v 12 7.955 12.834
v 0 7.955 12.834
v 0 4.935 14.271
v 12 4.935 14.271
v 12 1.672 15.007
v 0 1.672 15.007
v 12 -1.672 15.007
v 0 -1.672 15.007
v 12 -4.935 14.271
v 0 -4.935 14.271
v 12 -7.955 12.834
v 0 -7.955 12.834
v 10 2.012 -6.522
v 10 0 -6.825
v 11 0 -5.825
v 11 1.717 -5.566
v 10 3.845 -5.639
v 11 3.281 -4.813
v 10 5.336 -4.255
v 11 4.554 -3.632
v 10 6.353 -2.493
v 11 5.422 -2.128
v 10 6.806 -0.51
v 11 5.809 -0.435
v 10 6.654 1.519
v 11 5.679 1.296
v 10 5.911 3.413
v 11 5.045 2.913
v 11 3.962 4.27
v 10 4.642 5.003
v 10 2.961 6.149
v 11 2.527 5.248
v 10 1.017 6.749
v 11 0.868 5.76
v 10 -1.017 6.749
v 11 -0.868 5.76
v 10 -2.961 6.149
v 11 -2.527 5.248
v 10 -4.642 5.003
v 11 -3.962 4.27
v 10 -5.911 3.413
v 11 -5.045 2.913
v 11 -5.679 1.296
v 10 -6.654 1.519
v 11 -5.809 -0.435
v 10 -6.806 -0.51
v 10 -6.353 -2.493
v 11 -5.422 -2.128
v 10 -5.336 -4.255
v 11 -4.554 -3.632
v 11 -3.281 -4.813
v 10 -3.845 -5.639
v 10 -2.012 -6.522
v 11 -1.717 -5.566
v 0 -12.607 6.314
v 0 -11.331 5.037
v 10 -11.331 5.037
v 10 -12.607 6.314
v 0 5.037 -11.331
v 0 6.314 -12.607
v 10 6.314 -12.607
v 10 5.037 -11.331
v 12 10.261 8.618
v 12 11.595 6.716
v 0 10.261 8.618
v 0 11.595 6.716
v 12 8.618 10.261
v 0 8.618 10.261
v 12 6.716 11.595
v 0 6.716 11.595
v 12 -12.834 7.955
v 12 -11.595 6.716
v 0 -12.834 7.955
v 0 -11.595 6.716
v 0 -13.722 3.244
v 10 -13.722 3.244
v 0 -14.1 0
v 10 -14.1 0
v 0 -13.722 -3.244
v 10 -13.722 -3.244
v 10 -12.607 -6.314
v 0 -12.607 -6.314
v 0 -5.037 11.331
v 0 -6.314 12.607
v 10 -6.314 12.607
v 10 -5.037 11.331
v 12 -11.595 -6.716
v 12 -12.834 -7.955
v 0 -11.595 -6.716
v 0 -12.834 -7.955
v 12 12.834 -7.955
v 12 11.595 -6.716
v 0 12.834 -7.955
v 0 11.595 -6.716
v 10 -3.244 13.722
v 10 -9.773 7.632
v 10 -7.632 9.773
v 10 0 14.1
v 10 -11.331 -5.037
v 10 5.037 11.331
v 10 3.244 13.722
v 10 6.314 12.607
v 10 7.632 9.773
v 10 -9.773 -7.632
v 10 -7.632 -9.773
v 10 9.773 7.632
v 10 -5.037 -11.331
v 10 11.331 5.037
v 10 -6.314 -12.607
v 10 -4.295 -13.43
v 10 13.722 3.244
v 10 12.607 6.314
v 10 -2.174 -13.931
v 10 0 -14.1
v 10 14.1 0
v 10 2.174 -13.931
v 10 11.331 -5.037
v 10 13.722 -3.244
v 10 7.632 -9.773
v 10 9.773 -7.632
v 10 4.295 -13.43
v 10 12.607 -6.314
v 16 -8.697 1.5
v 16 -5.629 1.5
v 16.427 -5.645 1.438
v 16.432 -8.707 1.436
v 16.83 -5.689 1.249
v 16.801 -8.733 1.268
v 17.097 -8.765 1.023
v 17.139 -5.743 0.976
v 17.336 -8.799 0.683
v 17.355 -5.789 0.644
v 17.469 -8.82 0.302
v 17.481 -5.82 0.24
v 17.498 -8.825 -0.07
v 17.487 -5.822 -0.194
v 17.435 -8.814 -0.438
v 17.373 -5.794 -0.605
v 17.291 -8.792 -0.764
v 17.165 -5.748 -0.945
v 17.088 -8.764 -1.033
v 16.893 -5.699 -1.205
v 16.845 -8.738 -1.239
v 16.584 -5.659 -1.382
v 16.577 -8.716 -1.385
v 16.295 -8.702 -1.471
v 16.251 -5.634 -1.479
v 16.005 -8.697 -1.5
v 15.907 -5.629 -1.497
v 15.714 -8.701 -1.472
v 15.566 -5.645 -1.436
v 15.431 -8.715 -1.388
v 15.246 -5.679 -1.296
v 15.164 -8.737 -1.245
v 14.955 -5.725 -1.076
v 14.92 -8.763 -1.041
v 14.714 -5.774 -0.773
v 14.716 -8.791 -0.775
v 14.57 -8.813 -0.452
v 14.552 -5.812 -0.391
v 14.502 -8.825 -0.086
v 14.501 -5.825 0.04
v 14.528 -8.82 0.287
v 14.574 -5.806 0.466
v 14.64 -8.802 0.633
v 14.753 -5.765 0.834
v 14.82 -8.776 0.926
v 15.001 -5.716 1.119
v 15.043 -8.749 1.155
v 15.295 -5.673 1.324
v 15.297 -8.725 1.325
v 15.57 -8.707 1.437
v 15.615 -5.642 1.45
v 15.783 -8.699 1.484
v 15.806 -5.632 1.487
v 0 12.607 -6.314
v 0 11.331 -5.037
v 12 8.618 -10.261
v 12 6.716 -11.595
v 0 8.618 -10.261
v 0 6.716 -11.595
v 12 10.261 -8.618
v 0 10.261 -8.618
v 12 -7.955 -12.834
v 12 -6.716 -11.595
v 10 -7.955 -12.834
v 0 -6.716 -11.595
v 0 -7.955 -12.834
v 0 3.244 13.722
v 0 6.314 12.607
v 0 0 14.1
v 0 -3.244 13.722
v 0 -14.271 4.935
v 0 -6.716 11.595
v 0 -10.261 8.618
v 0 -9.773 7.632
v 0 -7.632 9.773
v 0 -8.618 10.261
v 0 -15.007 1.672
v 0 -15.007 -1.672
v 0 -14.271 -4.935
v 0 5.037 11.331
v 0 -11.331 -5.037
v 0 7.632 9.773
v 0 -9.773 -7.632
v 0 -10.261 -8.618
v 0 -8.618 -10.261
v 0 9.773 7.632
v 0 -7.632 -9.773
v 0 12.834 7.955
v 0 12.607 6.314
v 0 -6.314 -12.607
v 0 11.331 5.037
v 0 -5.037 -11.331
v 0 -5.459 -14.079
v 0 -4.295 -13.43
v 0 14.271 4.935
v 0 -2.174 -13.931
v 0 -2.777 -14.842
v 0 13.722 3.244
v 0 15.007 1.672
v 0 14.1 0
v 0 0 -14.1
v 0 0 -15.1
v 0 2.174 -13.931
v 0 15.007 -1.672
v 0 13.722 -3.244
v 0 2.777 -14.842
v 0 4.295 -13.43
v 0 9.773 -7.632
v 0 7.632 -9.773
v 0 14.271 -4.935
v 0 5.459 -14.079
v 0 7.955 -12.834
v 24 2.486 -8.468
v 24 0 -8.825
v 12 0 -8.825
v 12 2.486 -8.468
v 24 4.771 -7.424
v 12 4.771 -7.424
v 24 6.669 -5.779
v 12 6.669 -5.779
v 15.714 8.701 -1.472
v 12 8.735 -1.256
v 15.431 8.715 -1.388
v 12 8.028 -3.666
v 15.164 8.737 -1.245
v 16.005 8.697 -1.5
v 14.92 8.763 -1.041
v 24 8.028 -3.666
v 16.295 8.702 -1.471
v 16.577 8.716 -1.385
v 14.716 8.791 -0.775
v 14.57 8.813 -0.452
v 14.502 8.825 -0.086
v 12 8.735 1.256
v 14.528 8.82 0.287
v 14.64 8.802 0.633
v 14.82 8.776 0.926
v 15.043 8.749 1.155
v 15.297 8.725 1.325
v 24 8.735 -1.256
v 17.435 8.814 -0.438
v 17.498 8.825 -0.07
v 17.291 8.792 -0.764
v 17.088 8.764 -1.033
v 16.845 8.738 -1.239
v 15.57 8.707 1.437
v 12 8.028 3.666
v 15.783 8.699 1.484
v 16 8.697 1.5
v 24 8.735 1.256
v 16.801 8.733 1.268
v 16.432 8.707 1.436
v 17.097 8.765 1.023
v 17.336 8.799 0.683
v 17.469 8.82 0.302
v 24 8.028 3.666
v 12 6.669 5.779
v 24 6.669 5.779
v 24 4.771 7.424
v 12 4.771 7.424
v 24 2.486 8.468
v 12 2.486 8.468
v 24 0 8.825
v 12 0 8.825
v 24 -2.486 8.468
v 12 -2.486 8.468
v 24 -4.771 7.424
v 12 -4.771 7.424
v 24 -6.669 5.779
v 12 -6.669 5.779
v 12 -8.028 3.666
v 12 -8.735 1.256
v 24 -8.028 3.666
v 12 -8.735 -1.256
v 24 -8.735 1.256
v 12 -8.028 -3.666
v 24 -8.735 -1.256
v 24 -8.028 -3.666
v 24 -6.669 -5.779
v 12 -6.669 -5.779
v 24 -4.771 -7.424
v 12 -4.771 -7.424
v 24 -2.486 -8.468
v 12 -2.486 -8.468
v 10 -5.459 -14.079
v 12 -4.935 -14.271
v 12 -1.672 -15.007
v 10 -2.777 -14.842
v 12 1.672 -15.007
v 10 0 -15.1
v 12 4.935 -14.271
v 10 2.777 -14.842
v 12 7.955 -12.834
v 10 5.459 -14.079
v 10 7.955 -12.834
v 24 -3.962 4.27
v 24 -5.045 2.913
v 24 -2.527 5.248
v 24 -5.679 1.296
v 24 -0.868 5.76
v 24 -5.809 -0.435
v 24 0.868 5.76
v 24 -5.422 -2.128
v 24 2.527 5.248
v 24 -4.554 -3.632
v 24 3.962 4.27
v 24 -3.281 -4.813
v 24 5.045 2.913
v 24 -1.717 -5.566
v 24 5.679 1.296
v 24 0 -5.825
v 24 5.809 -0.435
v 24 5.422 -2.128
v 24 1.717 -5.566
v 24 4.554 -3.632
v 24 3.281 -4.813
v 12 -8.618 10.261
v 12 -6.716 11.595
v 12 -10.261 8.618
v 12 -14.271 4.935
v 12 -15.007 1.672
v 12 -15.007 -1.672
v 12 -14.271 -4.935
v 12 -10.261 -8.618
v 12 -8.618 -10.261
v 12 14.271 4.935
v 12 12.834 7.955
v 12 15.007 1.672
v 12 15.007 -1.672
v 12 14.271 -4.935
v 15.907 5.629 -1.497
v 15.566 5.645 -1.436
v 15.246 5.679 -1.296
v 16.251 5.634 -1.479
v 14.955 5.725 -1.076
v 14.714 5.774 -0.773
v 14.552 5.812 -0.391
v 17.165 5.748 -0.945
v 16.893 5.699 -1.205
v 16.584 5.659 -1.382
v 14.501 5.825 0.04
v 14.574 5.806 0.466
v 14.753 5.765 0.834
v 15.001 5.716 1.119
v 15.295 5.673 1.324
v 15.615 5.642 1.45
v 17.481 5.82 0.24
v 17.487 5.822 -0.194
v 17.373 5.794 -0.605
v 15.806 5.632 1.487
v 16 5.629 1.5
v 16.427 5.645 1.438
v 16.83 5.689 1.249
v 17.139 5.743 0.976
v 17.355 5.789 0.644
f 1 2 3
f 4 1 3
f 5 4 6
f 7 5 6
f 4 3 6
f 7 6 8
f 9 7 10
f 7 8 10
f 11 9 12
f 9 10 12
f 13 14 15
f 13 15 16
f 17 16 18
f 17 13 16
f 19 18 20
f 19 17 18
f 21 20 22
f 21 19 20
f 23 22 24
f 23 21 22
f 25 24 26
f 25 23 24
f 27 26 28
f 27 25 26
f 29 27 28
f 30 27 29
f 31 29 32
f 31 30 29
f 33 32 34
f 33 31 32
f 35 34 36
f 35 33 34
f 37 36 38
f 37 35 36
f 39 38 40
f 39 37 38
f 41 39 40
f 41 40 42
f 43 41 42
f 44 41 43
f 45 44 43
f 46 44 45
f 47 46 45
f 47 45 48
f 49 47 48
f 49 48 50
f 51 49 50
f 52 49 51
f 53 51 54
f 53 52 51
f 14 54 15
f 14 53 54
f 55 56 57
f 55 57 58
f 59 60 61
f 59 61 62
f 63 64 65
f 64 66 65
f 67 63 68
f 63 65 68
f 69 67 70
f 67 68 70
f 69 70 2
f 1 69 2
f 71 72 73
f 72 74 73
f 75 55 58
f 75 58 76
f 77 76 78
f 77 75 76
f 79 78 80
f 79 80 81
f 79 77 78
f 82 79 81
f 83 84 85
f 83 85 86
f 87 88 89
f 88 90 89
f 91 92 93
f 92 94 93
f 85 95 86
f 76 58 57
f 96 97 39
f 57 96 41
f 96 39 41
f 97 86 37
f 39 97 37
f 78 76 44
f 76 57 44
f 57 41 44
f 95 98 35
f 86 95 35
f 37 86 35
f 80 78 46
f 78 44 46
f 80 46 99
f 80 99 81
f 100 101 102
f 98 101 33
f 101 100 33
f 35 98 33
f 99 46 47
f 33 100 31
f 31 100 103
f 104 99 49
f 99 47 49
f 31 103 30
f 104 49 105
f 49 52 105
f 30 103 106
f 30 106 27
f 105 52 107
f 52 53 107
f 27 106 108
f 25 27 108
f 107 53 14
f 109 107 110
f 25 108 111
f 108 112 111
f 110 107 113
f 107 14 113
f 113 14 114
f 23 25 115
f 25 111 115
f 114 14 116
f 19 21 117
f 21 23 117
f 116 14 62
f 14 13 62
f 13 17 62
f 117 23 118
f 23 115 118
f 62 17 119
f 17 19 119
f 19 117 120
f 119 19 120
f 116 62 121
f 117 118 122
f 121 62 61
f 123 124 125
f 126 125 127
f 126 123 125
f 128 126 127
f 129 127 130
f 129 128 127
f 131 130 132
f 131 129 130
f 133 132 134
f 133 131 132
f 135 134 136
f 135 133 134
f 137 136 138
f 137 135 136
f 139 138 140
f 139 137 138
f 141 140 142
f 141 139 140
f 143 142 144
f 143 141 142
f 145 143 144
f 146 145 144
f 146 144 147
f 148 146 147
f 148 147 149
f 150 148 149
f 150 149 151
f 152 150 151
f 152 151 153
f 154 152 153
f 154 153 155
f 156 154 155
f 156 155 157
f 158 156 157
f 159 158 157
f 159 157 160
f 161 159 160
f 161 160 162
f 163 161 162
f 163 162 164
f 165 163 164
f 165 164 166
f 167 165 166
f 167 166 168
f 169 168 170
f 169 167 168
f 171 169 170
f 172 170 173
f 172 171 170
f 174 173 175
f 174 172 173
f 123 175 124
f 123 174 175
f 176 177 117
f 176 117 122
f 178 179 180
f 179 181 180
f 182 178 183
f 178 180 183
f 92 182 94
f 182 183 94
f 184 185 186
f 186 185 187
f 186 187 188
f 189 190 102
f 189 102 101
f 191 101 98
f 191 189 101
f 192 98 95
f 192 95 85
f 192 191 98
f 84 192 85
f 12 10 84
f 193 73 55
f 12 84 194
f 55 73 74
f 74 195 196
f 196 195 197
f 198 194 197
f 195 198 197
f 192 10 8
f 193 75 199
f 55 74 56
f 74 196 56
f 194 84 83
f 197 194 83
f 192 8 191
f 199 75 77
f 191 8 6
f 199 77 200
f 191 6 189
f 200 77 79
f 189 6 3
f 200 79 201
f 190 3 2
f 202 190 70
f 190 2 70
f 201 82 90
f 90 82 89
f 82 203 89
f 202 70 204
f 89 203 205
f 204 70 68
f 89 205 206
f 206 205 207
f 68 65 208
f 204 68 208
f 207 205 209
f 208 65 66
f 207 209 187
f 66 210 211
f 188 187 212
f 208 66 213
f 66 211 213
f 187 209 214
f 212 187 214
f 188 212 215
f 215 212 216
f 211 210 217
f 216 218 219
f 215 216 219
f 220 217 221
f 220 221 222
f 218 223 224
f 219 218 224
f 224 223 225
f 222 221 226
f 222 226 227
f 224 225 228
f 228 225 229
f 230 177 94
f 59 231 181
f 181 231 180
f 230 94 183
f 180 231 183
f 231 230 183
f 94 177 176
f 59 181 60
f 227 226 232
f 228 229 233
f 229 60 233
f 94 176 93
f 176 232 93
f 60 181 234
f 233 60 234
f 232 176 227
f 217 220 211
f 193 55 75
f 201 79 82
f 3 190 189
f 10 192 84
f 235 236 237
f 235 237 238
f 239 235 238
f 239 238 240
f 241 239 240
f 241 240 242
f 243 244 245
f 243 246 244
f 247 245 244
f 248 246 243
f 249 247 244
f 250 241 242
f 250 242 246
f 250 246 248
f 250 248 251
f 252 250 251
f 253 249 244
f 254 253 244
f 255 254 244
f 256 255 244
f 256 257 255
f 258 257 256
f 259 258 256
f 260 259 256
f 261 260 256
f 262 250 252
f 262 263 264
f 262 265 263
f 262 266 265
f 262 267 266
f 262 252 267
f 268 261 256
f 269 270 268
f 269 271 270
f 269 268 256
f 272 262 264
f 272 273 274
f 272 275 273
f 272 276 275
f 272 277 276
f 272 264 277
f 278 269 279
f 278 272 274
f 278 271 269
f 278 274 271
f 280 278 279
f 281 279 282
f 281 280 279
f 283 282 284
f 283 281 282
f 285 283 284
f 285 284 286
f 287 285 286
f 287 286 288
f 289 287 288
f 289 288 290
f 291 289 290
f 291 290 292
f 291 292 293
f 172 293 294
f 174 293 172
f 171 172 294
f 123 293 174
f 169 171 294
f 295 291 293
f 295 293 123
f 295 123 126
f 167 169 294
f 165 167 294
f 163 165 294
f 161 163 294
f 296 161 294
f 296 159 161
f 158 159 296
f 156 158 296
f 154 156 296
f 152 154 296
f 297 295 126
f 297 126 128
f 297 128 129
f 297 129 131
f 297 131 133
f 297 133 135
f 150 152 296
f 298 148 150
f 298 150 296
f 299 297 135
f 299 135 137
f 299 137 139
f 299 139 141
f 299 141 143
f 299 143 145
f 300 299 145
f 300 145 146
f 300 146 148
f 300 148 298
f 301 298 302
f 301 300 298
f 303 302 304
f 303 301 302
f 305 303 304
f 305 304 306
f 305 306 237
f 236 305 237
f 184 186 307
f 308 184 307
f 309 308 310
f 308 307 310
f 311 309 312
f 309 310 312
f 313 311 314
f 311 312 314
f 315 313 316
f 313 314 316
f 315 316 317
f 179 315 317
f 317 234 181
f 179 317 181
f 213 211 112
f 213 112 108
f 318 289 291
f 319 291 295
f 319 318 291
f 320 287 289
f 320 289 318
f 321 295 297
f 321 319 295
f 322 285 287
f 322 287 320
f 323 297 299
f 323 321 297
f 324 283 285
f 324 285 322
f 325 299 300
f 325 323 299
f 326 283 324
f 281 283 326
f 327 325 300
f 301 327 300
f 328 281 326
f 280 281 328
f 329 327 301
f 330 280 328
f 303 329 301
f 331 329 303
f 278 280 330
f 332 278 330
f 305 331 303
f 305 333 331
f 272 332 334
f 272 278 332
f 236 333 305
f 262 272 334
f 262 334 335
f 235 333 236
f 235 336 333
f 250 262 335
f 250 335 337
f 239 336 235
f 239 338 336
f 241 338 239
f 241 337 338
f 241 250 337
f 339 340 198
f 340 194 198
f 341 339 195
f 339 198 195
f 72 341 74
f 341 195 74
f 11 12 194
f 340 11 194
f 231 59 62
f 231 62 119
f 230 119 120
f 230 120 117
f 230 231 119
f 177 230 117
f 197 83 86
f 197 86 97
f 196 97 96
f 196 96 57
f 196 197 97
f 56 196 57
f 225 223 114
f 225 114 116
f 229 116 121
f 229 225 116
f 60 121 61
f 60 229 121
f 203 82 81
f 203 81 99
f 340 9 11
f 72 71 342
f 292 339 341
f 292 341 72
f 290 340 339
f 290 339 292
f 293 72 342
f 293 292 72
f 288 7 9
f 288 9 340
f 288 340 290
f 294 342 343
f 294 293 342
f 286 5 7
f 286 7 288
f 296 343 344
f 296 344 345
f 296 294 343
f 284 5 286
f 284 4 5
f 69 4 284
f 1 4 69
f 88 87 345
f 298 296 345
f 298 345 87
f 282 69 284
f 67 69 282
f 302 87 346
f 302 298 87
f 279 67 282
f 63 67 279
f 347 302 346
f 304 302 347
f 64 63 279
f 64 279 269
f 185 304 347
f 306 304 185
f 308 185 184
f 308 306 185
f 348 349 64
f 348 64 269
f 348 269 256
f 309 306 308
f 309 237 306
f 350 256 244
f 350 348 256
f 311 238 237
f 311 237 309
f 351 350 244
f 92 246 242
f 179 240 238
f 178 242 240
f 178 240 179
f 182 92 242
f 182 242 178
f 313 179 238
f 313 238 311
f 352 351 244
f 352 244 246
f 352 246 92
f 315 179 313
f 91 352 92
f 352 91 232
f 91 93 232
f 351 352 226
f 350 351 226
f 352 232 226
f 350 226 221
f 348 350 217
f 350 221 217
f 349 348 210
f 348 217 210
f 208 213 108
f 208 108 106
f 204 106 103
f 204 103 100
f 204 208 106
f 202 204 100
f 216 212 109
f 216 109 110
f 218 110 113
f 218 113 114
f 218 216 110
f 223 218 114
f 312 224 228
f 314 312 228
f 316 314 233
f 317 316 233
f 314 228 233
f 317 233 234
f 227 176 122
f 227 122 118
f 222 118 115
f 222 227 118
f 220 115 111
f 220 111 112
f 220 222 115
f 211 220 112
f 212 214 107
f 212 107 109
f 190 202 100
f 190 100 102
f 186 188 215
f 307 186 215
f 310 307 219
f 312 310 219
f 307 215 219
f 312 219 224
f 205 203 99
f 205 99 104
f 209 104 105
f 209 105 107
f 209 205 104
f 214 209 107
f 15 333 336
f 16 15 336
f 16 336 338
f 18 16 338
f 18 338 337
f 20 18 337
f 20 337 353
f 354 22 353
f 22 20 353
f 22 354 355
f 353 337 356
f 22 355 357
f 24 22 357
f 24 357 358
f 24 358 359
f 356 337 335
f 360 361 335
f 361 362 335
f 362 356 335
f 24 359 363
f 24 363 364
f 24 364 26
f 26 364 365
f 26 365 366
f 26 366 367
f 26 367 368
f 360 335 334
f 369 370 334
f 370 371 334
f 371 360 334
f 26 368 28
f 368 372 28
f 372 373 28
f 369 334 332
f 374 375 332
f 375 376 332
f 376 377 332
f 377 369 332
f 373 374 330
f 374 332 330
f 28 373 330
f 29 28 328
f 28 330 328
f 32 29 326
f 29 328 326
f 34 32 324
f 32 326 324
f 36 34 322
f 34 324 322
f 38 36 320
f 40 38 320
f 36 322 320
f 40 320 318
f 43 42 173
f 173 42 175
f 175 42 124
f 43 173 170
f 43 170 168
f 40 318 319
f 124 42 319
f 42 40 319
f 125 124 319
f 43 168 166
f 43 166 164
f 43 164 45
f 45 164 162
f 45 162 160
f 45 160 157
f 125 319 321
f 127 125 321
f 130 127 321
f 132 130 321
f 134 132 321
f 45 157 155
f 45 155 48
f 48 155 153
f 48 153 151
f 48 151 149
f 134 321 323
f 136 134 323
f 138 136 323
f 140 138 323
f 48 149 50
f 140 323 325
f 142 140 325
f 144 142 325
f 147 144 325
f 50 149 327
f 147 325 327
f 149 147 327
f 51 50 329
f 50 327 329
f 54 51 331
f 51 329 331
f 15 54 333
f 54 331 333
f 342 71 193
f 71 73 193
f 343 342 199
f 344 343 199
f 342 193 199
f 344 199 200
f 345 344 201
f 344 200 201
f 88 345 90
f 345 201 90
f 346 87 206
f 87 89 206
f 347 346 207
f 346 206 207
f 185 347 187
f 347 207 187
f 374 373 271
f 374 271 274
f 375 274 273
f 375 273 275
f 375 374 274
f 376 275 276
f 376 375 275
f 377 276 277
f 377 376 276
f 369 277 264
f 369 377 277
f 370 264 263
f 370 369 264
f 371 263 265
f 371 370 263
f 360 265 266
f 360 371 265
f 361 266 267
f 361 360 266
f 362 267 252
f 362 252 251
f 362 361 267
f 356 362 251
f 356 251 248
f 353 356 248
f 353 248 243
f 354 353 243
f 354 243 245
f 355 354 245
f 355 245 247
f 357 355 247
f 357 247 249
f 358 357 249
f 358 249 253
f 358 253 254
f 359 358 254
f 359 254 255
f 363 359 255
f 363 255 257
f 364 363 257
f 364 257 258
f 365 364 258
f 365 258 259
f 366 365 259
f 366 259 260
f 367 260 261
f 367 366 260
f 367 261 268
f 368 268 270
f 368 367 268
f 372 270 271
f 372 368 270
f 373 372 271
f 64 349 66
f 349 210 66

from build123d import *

# Parameters (mm, degrees)
BOSS_EXTRUDE2_DEPTH     = 10
BOSS_EXTRUDE3_DEPTH     = 2
SKETCH3_R               = 5.825
CUT_EXTRUDE1_DEPTH      = 2
BOSS_EXTRUDE4_START     = 12
SKETCH4_R               = 8.825
SKETCH4_R_2             = 5.825
BOSS_EXTRUDE4_DEPTH     = 12
CUT_EXTRUDE2_DEPTH      = 33.125068093
CUT_EXTRUDE2_DEPTH_BACK = 33.125068093
SKETCH5_R               = 1.5
CHAMFER1_SIZE           = 1


with BuildPart() as part:
    # Sketch1 → Boss-Extrude2 (new body)
    with BuildSketch(Plane(origin=(0, 0, 0), x_dir=(0, 0, -1), z_dir=(1, 0, 0))):
        with BuildLine():
            Line((-11.595322565, 6.716285775), (-12.834408967, 7.955372177))
            ThreePointArc((-12.834408967, 7.955372177), (-15.1, 0), (-12.834408967, -7.955372177))
            Line((-12.834408967, -7.955372177), (-11.595322565, -6.716285775))
            ThreePointArc((-11.595322565, -6.716285775), (-9.475230868, -9.475230868), (-6.716285775, -11.595322565))
            Line((-6.716285775, -11.595322565), (-7.955372177, -12.834408967))
            ThreePointArc((-7.955372177, -12.834408967), (0, -15.1), (7.955372177, -12.834408967))
            Line((7.955372177, -12.834408967), (6.716285775, -11.595322565))
            ThreePointArc((6.716285775, -11.595322565), (9.475230868, -9.475230868), (11.595322565, -6.716285775))
            Line((11.595322565, -6.716285775), (12.834408967, -7.955372177))
            ThreePointArc((12.834408967, -7.955372177), (14.522561334, -4.135844811), (15.1, 0))
            ThreePointArc((15.1, 0), (14.522561334, 4.135844811), (12.834408967, 7.955372177))
            Line((12.834408967, 7.955372177), (11.595322565, 6.716285775))
            ThreePointArc((11.595322565, 6.716285775), (9.475230868, 9.475230868), (6.716285775, 11.595322565))
            Line((6.716285775, 11.595322565), (7.955372177, 12.834408967))
            ThreePointArc((7.955372177, 12.834408967), (0, 15.1), (-7.955372177, 12.834408967))
            Line((-7.955372177, 12.834408967), (-6.716285775, 11.595322565))
            ThreePointArc((-6.716285775, 11.595322565), (-9.475230868, 9.475230868), (-11.595322565, 6.716285775))
        make_face()
        with BuildLine():
            Line((-11.330679795, 5.037429442), (-12.607267332, 6.31401698))
            ThreePointArc((-12.607267332, 6.31401698), (-14.1, 0), (-12.607267332, -6.31401698))
            Line((-12.607267332, -6.31401698), (-11.330679795, -5.037429442))
            ThreePointArc((-11.330679795, -5.037429442), (-8.768124087, -8.768124087), (-5.037429442, -11.330679795))
            Line((-5.037429442, -11.330679795), (-6.31401698, -12.607267332))
            ThreePointArc((-6.31401698, -12.607267332), (0, -14.1), (6.31401698, -12.607267332))
            Line((6.31401698, -12.607267332), (5.037429442, -11.330679795))
            ThreePointArc((5.037429442, -11.330679795), (8.768124087, -8.768124087), (11.330679795, -5.037429442))
            Line((11.330679795, -5.037429442), (12.607267332, -6.31401698))
            ThreePointArc((12.607267332, -6.31401698), (13.721743136, -3.244035343), (14.1, 0))
            ThreePointArc((14.1, 0), (13.721743136, 3.244035343), (12.607267332, 6.31401698))
            Line((12.607267332, 6.31401698), (11.330679795, 5.037429442))
            ThreePointArc((11.330679795, 5.037429442), (8.768124087, 8.768124087), (5.037429442, 11.330679795))
            Line((5.037429442, 11.330679795), (6.31401698, 12.607267332))
            ThreePointArc((6.31401698, 12.607267332), (0, 14.1), (-6.31401698, 12.607267332))
            Line((-6.31401698, 12.607267332), (-5.037429442, 11.330679795))
            ThreePointArc((-5.037429442, 11.330679795), (-8.768124087, 8.768124087), (-11.330679795, 5.037429442))
        make_face(mode=Mode.SUBTRACT)
    extrude(amount=BOSS_EXTRUDE2_DEPTH)

    # Sketch2 → Boss-Extrude3 (add)
    with BuildSketch(Plane(origin=(10, 0, 0), x_dir=(0, 0, -1), z_dir=(1, 0, 0))):
        with BuildLine():
            Line((-12.834408967, -7.955372177), (-11.595322565, -6.716285775))
            ThreePointArc((-11.595322565, -6.716285775), (-9.475230868, -9.475230868), (-6.716285775, -11.595322565))
            Line((-6.716285775, -11.595322565), (-7.955372177, -12.834408967))
            ThreePointArc((-7.955372177, -12.834408967), (0, -15.1), (7.955372177, -12.834408967))
            Line((7.955372177, -12.834408967), (6.716285775, -11.595322565))
            ThreePointArc((6.716285775, -11.595322565), (9.475230868, -9.475230868), (11.595322565, -6.716285775))
            Line((11.595322565, -6.716285775), (12.834408967, -7.955372177))
            ThreePointArc((12.834408967, -7.955372177), (15.1, 0), (12.834408967, 7.955372177))
            Line((12.834408967, 7.955372177), (11.595322565, 6.716285775))
            ThreePointArc((11.595322565, 6.716285775), (9.475230868, 9.475230868), (6.716285775, 11.595322565))
            Line((6.716285775, 11.595322565), (7.955372177, 12.834408967))
            ThreePointArc((7.955372177, 12.834408967), (0, 15.1), (-7.955372177, 12.834408967))
            Line((-7.955372177, 12.834408967), (-6.716285775, 11.595322565))
            ThreePointArc((-6.716285775, 11.595322565), (-9.475230868, 9.475230868), (-11.595322565, 6.716285775))
            Line((-11.595322565, 6.716285775), (-12.834408967, 7.955372177))
            ThreePointArc((-12.834408967, 7.955372177), (-15.1, 0), (-12.834408967, -7.955372177))
        make_face()
    extrude(amount=BOSS_EXTRUDE3_DEPTH)

    # Sketch3 → Cut-Extrude1 (cut)
    with BuildSketch(Plane(origin=(12, 0, 0), x_dir=(0, 0, -1), z_dir=(1, 0, 0))):
        Circle(SKETCH3_R)
    extrude(amount=-CUT_EXTRUDE1_DEPTH, mode=Mode.SUBTRACT)

    # Sketch4 → Boss-Extrude4 (add)
    with BuildSketch(Plane(origin=(12, 0, 0), x_dir=(0, 0, -1), z_dir=(1, 0, 0)).offset(BOSS_EXTRUDE4_START)):
        Circle(SKETCH4_R)
        Circle(SKETCH4_R_2, mode=Mode.SUBTRACT)
    extrude(amount=-BOSS_EXTRUDE4_DEPTH)

    # Sketch5 → Cut-Extrude2 (cut, two sides: drawn at the far end of the back side and taken through both)
    with BuildSketch(Plane(origin=(0, 0, 0), x_dir=(1, 0, 0), z_dir=(0, 1, 0)).offset(-CUT_EXTRUDE2_DEPTH_BACK)):
        with Locations(Location((16, 0, 0), (0, 0, 270))):
            Circle(SKETCH5_R)
    extrude(amount=CUT_EXTRUDE2_DEPTH + CUT_EXTRUDE2_DEPTH_BACK, mode=Mode.SUBTRACT)

    # Chamfer1
    chamfer1_edges = [part.edges().sort_by_distance(p)[0] for p in [
        (10, 0, 5.825),
    ]]
    chamfer(chamfer1_edges, length=CHAMFER1_SIZE)


solid = part.part
